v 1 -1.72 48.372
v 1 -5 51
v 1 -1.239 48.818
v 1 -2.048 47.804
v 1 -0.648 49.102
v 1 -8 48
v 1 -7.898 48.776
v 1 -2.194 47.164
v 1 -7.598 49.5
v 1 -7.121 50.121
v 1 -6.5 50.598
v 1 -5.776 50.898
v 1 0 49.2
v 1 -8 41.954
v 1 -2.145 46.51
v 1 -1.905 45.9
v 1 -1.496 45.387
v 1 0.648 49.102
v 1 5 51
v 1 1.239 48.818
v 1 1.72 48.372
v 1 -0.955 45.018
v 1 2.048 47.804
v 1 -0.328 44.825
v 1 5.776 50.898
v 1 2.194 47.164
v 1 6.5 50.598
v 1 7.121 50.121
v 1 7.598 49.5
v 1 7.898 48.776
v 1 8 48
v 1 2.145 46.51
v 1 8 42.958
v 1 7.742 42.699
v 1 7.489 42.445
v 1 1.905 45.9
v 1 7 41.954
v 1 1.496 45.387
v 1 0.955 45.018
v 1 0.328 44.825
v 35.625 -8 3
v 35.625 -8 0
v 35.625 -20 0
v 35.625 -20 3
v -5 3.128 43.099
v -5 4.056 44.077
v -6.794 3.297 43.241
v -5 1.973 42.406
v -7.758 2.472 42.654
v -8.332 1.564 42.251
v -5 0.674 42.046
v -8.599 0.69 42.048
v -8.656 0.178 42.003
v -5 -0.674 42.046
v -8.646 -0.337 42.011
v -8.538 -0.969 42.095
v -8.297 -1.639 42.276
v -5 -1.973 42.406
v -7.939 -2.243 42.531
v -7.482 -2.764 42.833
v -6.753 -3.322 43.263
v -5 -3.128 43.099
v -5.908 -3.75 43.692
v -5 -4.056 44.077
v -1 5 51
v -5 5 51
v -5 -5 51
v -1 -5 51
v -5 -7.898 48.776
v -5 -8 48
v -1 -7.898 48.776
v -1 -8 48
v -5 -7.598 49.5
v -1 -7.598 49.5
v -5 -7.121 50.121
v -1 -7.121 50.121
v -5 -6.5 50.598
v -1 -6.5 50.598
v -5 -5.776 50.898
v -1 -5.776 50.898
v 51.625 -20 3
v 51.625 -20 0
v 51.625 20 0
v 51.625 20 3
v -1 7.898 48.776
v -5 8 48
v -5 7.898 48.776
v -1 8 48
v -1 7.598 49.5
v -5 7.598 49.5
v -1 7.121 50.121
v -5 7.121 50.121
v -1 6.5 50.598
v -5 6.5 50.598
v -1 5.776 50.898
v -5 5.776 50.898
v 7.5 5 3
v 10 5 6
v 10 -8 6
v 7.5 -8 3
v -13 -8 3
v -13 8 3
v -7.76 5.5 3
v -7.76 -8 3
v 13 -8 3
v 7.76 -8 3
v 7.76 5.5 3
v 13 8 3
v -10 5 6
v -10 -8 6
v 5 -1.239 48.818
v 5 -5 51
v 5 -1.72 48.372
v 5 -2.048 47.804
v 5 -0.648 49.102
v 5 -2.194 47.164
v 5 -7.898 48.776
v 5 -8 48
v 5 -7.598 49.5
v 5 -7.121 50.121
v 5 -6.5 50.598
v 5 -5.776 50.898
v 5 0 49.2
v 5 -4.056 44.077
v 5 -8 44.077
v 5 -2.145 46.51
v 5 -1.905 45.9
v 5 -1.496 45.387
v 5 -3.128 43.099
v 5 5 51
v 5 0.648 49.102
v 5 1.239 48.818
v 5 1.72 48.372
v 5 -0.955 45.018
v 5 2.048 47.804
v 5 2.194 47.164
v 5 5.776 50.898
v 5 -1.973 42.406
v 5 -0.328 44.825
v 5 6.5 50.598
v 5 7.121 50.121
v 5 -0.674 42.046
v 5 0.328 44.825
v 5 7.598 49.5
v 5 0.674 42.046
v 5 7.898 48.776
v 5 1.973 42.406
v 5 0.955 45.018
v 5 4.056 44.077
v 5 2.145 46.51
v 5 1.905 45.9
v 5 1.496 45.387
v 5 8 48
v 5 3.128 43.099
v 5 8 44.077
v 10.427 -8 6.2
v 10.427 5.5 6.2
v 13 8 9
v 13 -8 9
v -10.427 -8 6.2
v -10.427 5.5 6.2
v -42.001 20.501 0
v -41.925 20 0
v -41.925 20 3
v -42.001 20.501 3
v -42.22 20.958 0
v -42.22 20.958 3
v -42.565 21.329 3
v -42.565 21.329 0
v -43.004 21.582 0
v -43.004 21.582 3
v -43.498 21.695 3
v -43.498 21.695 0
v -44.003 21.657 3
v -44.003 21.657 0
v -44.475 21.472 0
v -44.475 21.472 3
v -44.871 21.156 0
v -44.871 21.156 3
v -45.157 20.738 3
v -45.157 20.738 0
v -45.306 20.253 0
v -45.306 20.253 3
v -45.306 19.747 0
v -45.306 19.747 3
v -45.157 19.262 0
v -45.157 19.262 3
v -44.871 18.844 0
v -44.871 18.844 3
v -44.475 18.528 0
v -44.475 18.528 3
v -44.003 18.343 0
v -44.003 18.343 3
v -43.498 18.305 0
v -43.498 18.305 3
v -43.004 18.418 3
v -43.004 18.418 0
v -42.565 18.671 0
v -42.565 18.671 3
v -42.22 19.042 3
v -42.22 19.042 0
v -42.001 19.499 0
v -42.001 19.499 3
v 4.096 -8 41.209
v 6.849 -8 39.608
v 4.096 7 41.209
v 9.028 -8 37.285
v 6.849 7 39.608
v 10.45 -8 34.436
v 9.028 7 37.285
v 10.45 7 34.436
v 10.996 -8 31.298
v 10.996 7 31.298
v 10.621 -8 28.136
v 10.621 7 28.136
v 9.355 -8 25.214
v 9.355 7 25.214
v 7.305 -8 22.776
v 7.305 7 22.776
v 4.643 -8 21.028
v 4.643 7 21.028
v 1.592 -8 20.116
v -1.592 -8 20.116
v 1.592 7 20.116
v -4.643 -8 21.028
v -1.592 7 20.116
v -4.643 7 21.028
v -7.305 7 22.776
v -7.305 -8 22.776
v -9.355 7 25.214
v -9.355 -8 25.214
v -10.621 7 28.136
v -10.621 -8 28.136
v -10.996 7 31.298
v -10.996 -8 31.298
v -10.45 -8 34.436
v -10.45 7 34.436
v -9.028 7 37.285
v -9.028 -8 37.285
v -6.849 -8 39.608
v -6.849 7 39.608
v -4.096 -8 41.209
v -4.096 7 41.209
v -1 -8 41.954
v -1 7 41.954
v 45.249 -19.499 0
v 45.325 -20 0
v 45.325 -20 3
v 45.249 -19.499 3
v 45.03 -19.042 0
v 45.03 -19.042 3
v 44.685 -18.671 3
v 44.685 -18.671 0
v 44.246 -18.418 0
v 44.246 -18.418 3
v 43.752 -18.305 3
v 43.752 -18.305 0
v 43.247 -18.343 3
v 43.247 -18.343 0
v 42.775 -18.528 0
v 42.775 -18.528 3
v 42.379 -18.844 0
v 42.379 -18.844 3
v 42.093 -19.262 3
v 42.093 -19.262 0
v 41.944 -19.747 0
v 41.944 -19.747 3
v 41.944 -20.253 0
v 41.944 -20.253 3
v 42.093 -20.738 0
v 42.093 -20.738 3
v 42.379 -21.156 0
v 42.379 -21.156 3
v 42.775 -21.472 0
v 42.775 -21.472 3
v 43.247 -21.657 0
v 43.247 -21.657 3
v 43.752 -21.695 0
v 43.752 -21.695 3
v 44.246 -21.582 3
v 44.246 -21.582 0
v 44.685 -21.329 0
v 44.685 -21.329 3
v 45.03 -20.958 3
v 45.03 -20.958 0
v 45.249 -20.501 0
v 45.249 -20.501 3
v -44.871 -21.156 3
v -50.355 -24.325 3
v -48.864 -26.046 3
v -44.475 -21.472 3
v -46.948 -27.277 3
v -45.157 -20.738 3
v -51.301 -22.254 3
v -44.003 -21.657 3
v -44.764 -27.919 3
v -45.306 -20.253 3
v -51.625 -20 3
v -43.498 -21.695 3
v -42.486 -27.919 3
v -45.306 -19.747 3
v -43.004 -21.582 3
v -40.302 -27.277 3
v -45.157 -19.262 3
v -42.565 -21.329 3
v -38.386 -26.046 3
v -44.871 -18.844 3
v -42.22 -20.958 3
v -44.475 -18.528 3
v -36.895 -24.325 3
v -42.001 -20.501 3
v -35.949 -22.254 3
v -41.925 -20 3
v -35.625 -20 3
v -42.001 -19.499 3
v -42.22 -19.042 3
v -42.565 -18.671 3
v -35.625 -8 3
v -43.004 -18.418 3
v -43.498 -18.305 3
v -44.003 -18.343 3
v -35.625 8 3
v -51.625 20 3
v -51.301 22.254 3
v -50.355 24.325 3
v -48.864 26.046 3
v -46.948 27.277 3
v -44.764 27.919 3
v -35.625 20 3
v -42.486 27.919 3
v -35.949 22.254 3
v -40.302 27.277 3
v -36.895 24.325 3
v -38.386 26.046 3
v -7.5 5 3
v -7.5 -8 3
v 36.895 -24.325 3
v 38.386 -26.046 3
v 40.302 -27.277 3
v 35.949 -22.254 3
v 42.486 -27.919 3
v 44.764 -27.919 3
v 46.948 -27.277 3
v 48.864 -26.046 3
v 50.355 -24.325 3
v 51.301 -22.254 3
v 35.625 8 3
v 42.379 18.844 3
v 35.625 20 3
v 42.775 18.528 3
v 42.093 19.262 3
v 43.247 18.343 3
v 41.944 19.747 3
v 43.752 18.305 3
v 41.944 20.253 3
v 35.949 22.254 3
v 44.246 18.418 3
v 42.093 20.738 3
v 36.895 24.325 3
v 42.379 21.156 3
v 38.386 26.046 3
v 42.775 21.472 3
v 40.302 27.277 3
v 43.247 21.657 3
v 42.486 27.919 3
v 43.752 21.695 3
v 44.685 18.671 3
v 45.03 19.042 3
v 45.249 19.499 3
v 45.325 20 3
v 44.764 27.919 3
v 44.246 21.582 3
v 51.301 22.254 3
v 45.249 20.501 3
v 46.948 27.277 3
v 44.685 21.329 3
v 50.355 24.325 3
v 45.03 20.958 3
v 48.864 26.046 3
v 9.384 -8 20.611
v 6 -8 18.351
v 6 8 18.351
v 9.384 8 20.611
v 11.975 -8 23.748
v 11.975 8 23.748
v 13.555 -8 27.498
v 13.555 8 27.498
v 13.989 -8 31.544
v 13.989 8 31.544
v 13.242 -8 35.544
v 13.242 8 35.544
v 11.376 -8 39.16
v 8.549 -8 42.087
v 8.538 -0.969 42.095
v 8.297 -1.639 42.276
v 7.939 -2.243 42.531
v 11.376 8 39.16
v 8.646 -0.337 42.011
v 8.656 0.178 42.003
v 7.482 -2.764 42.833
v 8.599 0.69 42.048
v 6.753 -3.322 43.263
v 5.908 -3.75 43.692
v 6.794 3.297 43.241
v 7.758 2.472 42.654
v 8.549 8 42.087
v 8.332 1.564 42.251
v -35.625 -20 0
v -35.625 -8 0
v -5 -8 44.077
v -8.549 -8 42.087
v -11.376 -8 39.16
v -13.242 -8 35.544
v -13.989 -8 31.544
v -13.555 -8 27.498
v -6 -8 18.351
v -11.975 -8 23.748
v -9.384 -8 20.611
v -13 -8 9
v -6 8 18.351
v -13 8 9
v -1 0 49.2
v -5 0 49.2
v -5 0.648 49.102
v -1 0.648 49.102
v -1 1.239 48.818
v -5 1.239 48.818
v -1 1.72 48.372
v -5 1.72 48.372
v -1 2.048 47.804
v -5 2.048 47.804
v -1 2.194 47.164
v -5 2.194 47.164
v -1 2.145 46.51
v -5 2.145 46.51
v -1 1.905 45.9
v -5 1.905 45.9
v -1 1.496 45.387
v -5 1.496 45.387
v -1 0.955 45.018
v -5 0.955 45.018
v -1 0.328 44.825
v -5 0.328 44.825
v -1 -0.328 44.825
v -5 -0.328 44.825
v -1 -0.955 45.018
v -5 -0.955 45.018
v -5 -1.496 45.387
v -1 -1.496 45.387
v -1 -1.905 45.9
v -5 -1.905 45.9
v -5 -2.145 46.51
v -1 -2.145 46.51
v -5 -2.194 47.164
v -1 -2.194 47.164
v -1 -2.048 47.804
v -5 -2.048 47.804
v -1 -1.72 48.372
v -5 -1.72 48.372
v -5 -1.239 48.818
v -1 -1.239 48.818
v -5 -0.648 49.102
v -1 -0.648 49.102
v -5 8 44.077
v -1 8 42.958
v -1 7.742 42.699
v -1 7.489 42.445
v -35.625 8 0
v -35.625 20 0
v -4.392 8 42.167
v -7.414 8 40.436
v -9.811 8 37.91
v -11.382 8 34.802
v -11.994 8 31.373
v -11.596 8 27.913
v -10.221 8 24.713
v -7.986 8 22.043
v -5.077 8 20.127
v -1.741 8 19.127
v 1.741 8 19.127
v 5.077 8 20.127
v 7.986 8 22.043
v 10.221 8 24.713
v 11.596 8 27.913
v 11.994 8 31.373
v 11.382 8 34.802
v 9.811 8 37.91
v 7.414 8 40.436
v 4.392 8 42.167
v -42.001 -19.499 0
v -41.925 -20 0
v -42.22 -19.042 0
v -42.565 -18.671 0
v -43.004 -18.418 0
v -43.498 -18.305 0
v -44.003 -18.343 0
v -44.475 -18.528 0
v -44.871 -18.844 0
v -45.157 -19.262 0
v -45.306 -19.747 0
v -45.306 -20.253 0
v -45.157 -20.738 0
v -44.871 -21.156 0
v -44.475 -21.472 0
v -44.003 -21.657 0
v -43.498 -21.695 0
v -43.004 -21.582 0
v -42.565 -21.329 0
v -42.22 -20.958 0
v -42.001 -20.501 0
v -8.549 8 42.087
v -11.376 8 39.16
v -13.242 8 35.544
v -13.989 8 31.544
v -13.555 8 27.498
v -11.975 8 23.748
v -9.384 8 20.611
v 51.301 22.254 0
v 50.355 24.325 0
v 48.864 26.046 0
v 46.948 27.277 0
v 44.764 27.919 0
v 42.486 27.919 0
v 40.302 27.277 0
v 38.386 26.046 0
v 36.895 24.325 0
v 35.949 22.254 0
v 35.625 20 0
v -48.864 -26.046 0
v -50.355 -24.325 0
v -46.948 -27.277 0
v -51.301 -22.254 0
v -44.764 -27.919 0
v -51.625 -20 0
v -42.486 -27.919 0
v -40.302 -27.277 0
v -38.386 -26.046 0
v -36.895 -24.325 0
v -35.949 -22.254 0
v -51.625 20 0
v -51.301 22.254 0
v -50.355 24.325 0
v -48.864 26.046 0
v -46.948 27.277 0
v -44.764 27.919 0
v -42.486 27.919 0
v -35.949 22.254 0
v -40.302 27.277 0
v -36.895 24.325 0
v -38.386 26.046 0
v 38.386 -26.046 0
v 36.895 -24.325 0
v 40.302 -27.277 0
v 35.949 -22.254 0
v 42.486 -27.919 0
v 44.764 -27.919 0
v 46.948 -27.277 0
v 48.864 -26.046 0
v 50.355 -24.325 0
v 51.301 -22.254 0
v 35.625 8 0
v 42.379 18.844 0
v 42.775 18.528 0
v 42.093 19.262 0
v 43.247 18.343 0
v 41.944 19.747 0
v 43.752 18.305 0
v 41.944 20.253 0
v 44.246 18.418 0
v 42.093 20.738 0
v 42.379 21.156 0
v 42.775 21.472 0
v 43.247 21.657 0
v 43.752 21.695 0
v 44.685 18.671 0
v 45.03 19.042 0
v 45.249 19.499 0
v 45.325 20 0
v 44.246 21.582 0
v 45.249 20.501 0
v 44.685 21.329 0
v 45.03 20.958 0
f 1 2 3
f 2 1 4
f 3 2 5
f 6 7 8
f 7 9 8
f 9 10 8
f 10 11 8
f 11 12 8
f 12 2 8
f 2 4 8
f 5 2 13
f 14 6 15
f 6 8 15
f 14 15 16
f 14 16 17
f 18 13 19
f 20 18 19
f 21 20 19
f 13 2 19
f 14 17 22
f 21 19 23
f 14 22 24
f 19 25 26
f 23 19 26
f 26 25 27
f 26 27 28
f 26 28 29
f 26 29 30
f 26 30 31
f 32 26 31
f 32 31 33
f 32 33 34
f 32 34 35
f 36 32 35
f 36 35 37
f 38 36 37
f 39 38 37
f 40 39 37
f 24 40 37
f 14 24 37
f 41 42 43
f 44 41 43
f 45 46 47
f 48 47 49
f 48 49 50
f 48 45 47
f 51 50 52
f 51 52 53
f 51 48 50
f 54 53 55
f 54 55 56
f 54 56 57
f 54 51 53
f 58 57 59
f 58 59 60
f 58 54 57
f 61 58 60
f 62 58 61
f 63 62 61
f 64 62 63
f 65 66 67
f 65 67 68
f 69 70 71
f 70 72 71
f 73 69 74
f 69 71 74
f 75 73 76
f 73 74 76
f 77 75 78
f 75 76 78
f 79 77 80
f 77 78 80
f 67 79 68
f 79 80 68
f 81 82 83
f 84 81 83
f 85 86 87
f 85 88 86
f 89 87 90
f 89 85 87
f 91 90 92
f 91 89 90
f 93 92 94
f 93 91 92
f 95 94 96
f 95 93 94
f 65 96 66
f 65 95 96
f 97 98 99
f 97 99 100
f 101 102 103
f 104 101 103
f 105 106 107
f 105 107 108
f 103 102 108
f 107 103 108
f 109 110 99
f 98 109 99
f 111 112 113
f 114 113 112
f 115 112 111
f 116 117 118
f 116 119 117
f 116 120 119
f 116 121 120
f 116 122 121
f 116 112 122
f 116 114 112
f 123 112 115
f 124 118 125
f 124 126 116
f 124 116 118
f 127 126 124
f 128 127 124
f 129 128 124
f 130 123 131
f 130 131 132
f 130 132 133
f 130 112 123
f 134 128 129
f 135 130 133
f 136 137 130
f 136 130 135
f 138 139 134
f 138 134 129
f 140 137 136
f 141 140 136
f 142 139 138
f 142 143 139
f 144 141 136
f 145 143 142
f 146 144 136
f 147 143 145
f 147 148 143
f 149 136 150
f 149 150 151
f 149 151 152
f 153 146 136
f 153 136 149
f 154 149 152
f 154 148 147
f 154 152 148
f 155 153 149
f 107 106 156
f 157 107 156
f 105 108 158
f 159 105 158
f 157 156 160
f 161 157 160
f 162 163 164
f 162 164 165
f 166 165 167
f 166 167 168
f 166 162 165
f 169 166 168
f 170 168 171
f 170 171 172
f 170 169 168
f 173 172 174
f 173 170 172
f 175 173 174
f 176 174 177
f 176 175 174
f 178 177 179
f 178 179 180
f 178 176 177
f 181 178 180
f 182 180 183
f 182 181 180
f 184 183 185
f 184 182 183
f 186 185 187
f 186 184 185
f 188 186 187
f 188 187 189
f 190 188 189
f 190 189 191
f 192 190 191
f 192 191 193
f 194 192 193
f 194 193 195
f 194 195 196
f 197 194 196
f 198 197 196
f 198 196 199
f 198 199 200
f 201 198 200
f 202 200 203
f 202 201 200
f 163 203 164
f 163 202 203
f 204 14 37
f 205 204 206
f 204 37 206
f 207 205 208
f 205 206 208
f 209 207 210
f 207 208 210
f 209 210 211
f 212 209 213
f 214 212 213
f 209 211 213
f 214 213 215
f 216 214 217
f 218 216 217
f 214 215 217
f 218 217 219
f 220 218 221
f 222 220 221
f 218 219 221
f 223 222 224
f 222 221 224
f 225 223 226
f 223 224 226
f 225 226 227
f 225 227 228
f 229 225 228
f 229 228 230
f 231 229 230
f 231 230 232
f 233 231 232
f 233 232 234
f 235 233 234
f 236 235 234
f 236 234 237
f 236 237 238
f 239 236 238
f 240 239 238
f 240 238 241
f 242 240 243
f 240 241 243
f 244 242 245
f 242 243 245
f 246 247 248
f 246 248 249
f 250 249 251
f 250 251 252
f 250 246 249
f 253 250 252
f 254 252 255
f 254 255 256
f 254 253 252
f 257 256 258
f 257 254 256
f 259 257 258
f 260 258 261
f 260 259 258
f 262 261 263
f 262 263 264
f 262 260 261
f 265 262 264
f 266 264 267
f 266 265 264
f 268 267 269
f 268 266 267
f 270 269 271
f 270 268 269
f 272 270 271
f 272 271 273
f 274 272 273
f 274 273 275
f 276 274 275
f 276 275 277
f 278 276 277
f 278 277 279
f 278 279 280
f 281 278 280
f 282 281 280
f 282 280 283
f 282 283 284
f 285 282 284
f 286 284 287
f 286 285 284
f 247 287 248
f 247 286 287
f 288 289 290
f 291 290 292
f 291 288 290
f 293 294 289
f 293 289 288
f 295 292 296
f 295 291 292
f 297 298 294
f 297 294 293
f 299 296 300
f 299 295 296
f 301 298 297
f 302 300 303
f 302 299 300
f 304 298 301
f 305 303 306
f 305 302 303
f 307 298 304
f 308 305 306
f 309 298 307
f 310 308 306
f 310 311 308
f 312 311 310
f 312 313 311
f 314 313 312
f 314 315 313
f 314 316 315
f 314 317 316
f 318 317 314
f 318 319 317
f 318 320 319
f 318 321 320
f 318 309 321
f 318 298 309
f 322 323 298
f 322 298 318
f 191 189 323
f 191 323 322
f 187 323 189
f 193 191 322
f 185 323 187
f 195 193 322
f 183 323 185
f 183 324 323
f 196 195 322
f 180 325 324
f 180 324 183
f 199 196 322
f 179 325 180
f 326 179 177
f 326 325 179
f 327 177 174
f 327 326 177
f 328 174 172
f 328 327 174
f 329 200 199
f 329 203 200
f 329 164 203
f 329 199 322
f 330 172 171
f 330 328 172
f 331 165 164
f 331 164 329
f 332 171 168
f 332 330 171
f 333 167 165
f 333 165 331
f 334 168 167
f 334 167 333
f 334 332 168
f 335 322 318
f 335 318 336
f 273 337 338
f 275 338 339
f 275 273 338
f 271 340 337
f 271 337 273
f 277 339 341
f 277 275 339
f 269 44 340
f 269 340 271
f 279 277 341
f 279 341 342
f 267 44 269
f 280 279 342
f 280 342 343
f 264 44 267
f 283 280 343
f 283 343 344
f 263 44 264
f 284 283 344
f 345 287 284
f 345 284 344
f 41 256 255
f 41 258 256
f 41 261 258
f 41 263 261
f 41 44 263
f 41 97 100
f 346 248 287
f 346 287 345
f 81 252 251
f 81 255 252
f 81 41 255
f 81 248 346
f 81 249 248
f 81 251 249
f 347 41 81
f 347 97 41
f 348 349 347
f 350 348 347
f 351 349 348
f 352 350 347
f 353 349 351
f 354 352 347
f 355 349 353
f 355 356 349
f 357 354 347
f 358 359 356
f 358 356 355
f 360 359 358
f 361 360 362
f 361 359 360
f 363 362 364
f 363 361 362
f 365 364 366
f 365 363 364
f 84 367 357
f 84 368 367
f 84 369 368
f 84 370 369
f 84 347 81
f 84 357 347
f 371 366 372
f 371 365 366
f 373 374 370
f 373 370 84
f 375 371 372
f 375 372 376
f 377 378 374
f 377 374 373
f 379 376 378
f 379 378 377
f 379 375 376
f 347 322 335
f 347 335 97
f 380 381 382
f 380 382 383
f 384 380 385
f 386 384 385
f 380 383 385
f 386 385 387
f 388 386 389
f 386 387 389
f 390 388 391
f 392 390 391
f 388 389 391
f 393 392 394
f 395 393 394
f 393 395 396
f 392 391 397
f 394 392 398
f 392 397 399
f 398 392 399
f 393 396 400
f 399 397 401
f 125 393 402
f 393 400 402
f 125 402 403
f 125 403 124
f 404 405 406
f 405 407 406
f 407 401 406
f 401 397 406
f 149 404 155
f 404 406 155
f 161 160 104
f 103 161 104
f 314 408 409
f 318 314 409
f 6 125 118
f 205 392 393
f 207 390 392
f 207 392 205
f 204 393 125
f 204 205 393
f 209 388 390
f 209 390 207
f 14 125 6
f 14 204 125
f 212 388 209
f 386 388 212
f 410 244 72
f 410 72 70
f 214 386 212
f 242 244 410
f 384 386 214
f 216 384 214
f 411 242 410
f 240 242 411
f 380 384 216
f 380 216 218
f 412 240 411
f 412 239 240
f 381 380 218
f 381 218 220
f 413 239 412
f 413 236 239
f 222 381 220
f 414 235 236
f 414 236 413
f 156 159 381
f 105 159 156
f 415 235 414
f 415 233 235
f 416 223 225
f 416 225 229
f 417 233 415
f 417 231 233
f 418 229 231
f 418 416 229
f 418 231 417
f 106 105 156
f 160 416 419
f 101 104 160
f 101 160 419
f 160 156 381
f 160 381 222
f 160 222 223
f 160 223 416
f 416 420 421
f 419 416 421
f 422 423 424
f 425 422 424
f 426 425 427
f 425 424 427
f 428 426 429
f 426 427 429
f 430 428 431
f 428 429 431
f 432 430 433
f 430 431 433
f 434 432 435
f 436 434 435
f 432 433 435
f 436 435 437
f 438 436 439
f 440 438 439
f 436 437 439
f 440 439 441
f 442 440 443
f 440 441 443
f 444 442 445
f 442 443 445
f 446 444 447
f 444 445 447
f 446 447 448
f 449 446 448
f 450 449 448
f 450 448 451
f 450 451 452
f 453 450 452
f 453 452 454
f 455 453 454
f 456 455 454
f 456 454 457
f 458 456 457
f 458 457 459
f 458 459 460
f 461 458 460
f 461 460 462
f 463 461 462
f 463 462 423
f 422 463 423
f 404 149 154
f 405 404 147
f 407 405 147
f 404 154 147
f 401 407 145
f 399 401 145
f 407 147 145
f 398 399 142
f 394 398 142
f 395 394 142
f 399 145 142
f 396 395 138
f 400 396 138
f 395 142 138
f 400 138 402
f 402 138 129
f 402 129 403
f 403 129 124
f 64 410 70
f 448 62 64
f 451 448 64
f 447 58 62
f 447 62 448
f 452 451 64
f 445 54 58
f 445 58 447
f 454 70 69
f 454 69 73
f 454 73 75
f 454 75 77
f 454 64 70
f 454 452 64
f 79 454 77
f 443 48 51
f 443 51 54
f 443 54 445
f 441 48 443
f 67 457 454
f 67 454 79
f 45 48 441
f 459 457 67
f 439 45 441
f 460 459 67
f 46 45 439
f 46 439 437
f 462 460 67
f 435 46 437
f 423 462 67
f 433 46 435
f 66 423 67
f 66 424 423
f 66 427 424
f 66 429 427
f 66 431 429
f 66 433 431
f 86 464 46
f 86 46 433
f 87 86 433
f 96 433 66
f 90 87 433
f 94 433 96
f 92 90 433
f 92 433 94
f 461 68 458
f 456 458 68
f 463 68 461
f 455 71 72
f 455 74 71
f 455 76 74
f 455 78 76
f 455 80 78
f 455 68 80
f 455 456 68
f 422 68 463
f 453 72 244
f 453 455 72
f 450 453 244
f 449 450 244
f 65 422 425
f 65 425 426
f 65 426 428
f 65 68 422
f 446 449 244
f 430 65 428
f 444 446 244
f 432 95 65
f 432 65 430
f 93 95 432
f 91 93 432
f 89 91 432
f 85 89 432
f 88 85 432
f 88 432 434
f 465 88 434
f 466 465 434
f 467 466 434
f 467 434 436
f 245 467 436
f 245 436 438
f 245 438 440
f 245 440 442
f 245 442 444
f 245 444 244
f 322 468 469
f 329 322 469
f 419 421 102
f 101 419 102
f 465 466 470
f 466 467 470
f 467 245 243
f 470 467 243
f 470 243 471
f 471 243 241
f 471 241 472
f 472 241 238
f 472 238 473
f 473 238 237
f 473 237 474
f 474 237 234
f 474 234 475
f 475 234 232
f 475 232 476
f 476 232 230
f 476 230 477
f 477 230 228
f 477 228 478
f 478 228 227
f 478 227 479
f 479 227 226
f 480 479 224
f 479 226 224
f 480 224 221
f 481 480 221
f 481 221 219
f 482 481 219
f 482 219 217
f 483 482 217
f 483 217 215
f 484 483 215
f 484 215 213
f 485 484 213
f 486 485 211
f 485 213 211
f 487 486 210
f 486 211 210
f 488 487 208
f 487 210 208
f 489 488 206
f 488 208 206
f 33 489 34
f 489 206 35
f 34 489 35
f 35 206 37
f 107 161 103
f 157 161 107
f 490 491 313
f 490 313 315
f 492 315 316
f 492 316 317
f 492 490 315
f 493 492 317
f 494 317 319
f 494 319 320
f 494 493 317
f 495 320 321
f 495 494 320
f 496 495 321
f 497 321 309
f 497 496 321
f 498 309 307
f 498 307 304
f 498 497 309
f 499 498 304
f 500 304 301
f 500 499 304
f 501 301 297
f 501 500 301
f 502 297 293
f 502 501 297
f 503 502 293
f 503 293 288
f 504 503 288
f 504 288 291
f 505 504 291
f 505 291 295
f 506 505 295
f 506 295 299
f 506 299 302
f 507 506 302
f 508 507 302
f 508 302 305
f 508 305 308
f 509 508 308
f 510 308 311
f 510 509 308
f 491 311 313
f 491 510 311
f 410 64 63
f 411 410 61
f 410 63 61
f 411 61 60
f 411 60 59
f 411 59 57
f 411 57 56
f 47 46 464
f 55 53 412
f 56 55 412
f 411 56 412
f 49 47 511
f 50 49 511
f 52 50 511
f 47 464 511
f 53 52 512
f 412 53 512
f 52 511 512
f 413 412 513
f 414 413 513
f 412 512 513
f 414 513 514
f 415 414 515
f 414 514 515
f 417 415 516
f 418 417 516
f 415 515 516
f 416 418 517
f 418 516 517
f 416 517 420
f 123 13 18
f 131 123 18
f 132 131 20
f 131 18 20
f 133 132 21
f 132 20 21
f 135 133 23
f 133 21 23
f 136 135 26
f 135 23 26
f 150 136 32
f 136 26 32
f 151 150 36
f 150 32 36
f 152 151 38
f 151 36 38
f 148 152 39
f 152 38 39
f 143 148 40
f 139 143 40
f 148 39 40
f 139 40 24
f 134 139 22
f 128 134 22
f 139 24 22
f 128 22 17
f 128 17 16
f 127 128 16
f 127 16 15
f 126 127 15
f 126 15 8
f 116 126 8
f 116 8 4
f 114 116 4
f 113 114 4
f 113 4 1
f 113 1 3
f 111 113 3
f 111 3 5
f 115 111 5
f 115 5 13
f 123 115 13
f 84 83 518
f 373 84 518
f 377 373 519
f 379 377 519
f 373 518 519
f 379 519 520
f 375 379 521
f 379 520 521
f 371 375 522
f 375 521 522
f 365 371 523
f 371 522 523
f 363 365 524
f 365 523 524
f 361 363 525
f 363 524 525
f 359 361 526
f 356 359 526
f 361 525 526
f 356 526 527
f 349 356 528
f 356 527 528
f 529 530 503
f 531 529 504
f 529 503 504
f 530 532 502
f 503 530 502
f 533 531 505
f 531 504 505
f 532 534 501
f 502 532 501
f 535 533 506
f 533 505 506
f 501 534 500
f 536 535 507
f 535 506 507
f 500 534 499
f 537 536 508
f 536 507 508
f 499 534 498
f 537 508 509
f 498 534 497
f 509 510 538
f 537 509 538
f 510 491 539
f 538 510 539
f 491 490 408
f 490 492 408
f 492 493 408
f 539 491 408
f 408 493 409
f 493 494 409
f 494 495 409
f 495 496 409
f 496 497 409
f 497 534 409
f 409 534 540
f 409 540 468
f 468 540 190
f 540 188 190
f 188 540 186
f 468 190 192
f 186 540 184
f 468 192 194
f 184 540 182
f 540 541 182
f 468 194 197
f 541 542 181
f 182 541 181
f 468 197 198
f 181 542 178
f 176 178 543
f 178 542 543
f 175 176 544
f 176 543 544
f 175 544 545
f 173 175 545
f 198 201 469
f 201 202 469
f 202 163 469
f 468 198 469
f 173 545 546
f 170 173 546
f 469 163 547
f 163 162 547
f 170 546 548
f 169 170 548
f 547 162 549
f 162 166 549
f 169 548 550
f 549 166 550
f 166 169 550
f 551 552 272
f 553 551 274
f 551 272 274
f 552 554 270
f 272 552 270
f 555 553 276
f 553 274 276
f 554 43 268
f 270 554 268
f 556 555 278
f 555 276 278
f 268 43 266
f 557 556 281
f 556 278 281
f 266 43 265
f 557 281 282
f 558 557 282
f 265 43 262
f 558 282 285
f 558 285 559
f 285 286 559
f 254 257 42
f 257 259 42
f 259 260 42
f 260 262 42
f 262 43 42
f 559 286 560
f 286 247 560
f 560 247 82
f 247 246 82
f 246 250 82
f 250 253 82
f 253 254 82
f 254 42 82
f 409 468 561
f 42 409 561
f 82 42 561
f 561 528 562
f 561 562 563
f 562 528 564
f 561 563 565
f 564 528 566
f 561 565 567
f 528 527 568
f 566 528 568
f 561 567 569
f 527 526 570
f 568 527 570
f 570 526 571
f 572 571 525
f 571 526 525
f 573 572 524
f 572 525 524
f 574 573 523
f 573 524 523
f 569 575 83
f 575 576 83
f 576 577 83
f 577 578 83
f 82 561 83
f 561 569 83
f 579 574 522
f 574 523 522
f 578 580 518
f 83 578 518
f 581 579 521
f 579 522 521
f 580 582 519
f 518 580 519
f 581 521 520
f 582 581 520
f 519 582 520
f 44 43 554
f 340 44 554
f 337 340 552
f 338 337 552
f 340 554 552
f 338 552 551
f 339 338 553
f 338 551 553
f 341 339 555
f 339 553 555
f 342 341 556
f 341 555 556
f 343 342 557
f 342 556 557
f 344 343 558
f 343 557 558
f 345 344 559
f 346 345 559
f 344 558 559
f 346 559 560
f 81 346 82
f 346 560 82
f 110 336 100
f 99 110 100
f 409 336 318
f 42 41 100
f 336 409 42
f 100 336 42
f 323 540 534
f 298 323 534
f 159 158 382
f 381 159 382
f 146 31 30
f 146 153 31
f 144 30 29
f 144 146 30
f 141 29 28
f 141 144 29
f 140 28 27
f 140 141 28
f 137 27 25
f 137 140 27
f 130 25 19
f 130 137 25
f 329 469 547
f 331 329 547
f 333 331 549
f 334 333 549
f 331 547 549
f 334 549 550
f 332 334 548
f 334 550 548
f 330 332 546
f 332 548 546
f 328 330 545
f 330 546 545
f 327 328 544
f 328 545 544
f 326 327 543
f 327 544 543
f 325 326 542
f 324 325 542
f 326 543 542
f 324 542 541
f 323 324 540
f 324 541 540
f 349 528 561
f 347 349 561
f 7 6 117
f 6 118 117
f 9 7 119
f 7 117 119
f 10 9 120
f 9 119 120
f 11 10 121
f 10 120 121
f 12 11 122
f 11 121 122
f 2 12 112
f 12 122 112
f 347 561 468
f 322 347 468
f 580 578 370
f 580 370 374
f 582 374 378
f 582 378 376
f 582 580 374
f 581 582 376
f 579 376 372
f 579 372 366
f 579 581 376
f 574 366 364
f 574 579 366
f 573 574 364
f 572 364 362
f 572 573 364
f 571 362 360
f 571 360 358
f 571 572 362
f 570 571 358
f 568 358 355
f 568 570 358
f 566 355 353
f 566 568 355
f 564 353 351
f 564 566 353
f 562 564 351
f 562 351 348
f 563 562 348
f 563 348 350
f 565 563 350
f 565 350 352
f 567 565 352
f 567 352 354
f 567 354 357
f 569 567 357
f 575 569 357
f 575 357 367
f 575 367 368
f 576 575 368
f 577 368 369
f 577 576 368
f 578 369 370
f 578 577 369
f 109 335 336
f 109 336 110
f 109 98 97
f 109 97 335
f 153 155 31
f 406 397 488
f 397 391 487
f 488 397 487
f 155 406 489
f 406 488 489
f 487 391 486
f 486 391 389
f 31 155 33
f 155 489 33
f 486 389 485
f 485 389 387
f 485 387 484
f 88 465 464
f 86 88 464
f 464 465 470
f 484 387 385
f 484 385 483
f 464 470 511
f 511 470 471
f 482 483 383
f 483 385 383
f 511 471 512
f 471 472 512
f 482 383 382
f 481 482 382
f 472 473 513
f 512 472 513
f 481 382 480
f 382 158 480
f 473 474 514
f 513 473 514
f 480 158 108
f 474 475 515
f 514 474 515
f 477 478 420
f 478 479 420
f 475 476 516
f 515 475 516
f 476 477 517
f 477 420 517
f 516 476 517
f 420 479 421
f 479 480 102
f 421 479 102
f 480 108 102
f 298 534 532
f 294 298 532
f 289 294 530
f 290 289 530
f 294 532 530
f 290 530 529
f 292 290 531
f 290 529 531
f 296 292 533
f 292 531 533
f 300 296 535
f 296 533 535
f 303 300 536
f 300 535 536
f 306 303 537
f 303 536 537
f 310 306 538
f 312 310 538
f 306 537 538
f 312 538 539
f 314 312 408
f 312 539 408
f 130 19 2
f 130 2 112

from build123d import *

# Parameters (mm, degrees)
SKETCH1_R               = 1.7
SKETCH1_W               = 71.25
SKETCH1_H               = 16
BOSS_EXTRUDE1_DEPTH     = 3
BOSS_EXTRUDE2_DEPTH     = 13
SKETCH5_R               = 11
BOSS_EXTRUDE3_DEPTH     = 16
BOSS_EXTRUDE4_DEPTH     = 16
SKETCH7_W               = 2
SKETCH7_H               = 12
CUT_EXTRUDE1_DEPTH      = 37
SKETCH8_R               = 2.2
CUT_EXTRUDE2_DEPTH      = 5
CUT_EXTRUDE2_DEPTH_BACK = 15
SKETCH9_R               = 5
CUT_EXTRUDE3_DEPTH      = 5
CUT_EXTRUDE4_DEPTH      = 13.5
FILLET1_R               = 3
CHAMFER1_SIZE           = 1


with BuildPart() as part:
    # Sketch1 → Boss-Extrude1 (new body)
    with BuildSketch(Plane.XY):
        with BuildLine():
            Line((-35.625, 8), (-35.625, 20))
            ThreePointArc((-35.625, 20), (-43.625, 28), (-51.625, 20))
            Line((-51.625, 20), (-51.625, 9e-09))
            ThreePointArc((-51.625, 9e-09), (-49.281854246, 5.656854253), (-43.625, 8))
            Line((-43.625, 8), (-35.625, 8))
        make_face()
        with Locations((-43.625, 20)):
            Circle(SKETCH1_R, mode=Mode.SUBTRACT)
        with BuildLine():
            Line((-35.625, -20), (-35.625, -8))
            Line((-35.625, -8), (-43.625, -8))
            ThreePointArc((-43.625, -8), (-49.281854253, -5.656854246), (-51.625, 9e-09))
            Line((-51.625, 9e-09), (-51.625, -20))
            ThreePointArc((-51.625, -20), (-43.625, -28), (-35.625, -20))
        make_face()
        with Locations((-43.625, -20)):
            Circle(SKETCH1_R, mode=Mode.SUBTRACT)
        Rectangle(SKETCH1_W, SKETCH1_H)
        with BuildLine():
            Line((-35.625, -8), (-35.625, 8))
            Line((-35.625, 8), (-43.625, 8))
            ThreePointArc((-43.625, 8), (-49.281854246, 5.656854253), (-51.625, 9e-09))
            ThreePointArc((-51.625, 9e-09), (-49.281854253, -5.656854246), (-43.625, -8))
            Line((-43.625, -8), (-35.625, -8))
        make_face()
        with BuildLine():
            Line((43.625, 8), (35.625, 8))
            Line((35.625, 8), (35.625, -8))
            Line((35.625, -8), (43.625, -8))
            ThreePointArc((43.625, -8), (49.281854249, -5.656854249), (51.625, 0))
            ThreePointArc((51.625, 0), (49.281854249, 5.656854249), (43.625, 8))
        make_face()
        with BuildLine():
            Line((35.625, 20), (35.625, 8))
            Line((35.625, 8), (43.625, 8))
            ThreePointArc((43.625, 8), (49.281854249, 5.656854249), (51.625, 0))
            Line((51.625, 0), (51.625, 20))
            ThreePointArc((51.625, 20), (43.625, 28), (35.625, 20))
        make_face()
        with Locations((43.625, 20)):
            Circle(SKETCH1_R, mode=Mode.SUBTRACT)
        with BuildLine():
            Line((43.625, -8), (35.625, -8))
            Line((35.625, -8), (35.625, -20))
            ThreePointArc((35.625, -20), (43.625, -28), (51.625, -20))
            Line((51.625, -20), (51.625, 0))
            ThreePointArc((51.625, 0), (49.281854249, -5.656854249), (43.625, -8))
        make_face()
        with Locations((43.625, -20)):
            Circle(SKETCH1_R, mode=Mode.SUBTRACT)
    extrude(amount=BOSS_EXTRUDE1_DEPTH)

    # Sketch2 → Boss-Extrude2 (add)
    with BuildSketch(Plane.XZ.offset(8)):
        Polygon((-10, 6), (10, 6), (7.5, 3), (-7.5, 3), align=None)
    extrude(amount=-BOSS_EXTRUDE2_DEPTH)


with BuildPart() as body_2:
    # Sketch5 → Boss-Extrude3 (new body)
    with BuildSketch(Plane(origin=(0, 8, 0), x_dir=(1, 0, 0), z_dir=(0, 1, 0))):
        with BuildLine():
            Line((-13, -3), (13, -3))
            Line((13, -3), (13, -9))
            Line((13, -9), (6, -18.350889359))
            ThreePointArc((6, -18.350889359), (0, -45), (-6, -18.350889359))
            Line((-6, -18.350889359), (-13, -9))
            Line((-13, -9), (-13, -3))
        make_face()
        with Locations((0, -31)):
            Circle(SKETCH5_R, mode=Mode.SUBTRACT)
    extrude(amount=-BOSS_EXTRUDE3_DEPTH)

    # Sketch6 → Boss-Extrude4 (add)
    with BuildSketch(Plane(origin=(0, 8, 0), x_dir=(1, 0, 0), z_dir=(0, 1, 0))):
        with BuildLine():
            ThreePointArc((5, -44.076696831), (0, -45), (-5, -44.076696831))
            Line((-5, -44.076696831), (-5, -51))
            Line((-5, -51), (5, -51))
            Line((5, -51), (5, -44.076696831))
        make_face()
    extrude(amount=-BOSS_EXTRUDE4_DEPTH)

    # Sketch7 → Cut-Extrude1 (cut, through all)
    with BuildSketch(Plane(origin=(0, 8, 0), x_dir=(1, 0, 0), z_dir=(0, 1, 0))):
        with Locations((0, -45)):
            Rectangle(SKETCH7_W, SKETCH7_H)
    extrude(amount=-CUT_EXTRUDE1_DEPTH, mode=Mode.SUBTRACT)

    # Sketch8 → Cut-Extrude2 (cut, two sides)
    with BuildSketch(Plane.ZY.offset(5)) as cut_extrude2_sk:
        with Locations((47, 0)):
            Circle(SKETCH8_R)
    extrude(amount=CUT_EXTRUDE2_DEPTH, mode=Mode.SUBTRACT)
    extrude(cut_extrude2_sk.sketch, amount=-CUT_EXTRUDE2_DEPTH_BACK, mode=Mode.SUBTRACT)

    # Sketch9 → Cut-Extrude3 (cut)
    with BuildSketch(Plane.ZY.offset(5)):
        with Locations((47, 0)):
            Circle(SKETCH9_R)
    cut_extrude3 = extrude(amount=CUT_EXTRUDE3_DEPTH, mode=Mode.SUBTRACT)

    # Mirror1: Cut-Extrude3 across plane
    add(cut_extrude3.mirror(Plane(origin=(0, 0, 0), x_dir=(0, 0, 1), z_dir=(1, 0, 0))), mode=Mode.SUBTRACT)

    # Sketch10 → Cut-Extrude4 (cut)
    with BuildSketch(Plane.XZ.offset(8)):
        Polygon((-7.653644256, 2.87196312), (7.653644256, 2.87196312), (10.427008323, 6.2), (-10.427008323, 6.2), align=None)
    extrude(amount=-CUT_EXTRUDE4_DEPTH, mode=Mode.SUBTRACT)

    # Fillet1
    fillet1_edges = [body_2.edges().sort_by_distance(p)[0] for p in [
        (-3, -8, 51),
        (-3, 8, 51),
        (3, 8, 51),
        (3, -8, 51),
    ]]
    fillet(fillet1_edges, radius=FILLET1_R)

    # Chamfer1
    chamfer1_edges = [body_2.edges().sort_by_distance(p)[0] for p in [
        (0, 8, 20),
    ]]
    chamfer(chamfer1_edges, length=CHAMFER1_SIZE)


solid = Compound([part.part, body_2.part])
